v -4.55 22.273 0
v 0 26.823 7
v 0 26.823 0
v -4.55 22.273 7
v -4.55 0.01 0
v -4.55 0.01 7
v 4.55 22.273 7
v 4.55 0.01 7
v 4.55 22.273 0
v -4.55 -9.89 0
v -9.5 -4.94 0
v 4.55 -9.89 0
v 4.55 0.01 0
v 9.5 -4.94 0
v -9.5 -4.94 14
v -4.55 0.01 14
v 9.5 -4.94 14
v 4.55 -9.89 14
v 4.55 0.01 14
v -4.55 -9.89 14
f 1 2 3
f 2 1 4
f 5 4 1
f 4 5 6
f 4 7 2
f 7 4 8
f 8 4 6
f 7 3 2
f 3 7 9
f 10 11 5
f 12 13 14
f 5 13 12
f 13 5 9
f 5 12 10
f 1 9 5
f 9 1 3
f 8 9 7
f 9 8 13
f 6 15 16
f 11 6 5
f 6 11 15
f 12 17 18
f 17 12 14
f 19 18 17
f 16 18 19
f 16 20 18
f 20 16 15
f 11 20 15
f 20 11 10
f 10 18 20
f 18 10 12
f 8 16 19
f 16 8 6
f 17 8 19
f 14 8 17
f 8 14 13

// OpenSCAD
//Spacers for Wanhao Duplicator 4S
//Used to align the cover with the frame
//Ari M. Diacou
//January 2016
//Shared under Creative Commons License: Attribution-ShareAlike 3.0 Unported (CC BY-SA 3.0) 
//see http://creativecommons.org/licenses/by-sa/3.0/

inch=25.4+0;//In case you want to specify distances in inches (1"=25.4mm).
//The hole these will fit into is roughly hexagonal. Measure the widest corner to corner distance.
widest_corner_to_corner_distance=19.3;
//Measure the distance between the corners in a direction outward from the top-center of the printer. This direction should be perpendicular to the one just measured.
corner_to_corner_distance_in_outward_direction=10;
//Measure the depth/height of the curled over part of the top frame. 
base_depth=7;
//How high would you like your spacer to rise off the frame?
tip_height=7;
//What is the left-right distance of the gap between the frame angle bars?
frame_width=366.7;
//What is the distance of the gap between the frame angle bars, in the front to back direction? 
frame_depth=219.1;
//What is the inside left-right distance of your cover?
cover_width=412.8;
//What is the inside front-back distance of your cover?
cover_depth=266.7;
//A tolerance distance that makes the dimensions smaller by relative but appropriate? amounts. 1 = 1mm shaved off the widest corner to corner distance, .5mm in the corner to corner distance in outward direction, and would give a 3mm tolerance in the width, and 2mm in the depth directions.
tolerance=.2;
/*[Hidden]*/
///////////////// Derived Parameters ////////////////////////
b=corner_to_corner_distance_in_outward_direction-tolerance/2; 
a=(min(cover_width-frame_width-3*tolerance,cover_depth-frame_depth-2*tolerance)-sqrt(2)*b)*sqrt(2)/2; 
c=widest_corner_to_corner_distance-corner_to_corner_distance_in_outward_direction-tolerance; 
A=[0,a+c/2];
B=[c/2,a];I=left(B);
C=[c/2,0];H=left(C);
D=[c/2+b/2,-b/2];G=left(D);
E=[c/2,-b];F=left(E);
TIP=[A,B,C,H,I];
BASE=[C,D,E,F,G,H];
/////////////////// Testing Output //////////////////////////
echo(str("cover width-frame width(x)=",cover_width-frame_width," mm"));
echo(str("cover depth-frame depth(y)=",cover_depth-frame_depth ," mm"));
echo(str("a=",a," mm"));
echo(str("b=",b," mm"));
echo(str("c=",c," mm"));
echo(str("tip length=",A[1]," mm"));
echo(str("total length=",A[1]+b," mm"));
echo(str("total width=",D[0]*2," mm"));
echo(str("total height=",tip_height+base_depth," mm"));
echo(str("suggested filename = spacer a=",a,",b=",b,",c=",c,",z=",tip_height));
/////////////////////// Main() //////////////////////////////
color("red") linear_extrude(tip_height) polygon(TIP);
translate([0,.01,0]) color("brown") linear_extrude(tip_height+base_depth) polygon(BASE);
//////////////////// Functions //////////////////////////////
function left(RIGHT)=[-RIGHT[0],RIGHT[1]];
